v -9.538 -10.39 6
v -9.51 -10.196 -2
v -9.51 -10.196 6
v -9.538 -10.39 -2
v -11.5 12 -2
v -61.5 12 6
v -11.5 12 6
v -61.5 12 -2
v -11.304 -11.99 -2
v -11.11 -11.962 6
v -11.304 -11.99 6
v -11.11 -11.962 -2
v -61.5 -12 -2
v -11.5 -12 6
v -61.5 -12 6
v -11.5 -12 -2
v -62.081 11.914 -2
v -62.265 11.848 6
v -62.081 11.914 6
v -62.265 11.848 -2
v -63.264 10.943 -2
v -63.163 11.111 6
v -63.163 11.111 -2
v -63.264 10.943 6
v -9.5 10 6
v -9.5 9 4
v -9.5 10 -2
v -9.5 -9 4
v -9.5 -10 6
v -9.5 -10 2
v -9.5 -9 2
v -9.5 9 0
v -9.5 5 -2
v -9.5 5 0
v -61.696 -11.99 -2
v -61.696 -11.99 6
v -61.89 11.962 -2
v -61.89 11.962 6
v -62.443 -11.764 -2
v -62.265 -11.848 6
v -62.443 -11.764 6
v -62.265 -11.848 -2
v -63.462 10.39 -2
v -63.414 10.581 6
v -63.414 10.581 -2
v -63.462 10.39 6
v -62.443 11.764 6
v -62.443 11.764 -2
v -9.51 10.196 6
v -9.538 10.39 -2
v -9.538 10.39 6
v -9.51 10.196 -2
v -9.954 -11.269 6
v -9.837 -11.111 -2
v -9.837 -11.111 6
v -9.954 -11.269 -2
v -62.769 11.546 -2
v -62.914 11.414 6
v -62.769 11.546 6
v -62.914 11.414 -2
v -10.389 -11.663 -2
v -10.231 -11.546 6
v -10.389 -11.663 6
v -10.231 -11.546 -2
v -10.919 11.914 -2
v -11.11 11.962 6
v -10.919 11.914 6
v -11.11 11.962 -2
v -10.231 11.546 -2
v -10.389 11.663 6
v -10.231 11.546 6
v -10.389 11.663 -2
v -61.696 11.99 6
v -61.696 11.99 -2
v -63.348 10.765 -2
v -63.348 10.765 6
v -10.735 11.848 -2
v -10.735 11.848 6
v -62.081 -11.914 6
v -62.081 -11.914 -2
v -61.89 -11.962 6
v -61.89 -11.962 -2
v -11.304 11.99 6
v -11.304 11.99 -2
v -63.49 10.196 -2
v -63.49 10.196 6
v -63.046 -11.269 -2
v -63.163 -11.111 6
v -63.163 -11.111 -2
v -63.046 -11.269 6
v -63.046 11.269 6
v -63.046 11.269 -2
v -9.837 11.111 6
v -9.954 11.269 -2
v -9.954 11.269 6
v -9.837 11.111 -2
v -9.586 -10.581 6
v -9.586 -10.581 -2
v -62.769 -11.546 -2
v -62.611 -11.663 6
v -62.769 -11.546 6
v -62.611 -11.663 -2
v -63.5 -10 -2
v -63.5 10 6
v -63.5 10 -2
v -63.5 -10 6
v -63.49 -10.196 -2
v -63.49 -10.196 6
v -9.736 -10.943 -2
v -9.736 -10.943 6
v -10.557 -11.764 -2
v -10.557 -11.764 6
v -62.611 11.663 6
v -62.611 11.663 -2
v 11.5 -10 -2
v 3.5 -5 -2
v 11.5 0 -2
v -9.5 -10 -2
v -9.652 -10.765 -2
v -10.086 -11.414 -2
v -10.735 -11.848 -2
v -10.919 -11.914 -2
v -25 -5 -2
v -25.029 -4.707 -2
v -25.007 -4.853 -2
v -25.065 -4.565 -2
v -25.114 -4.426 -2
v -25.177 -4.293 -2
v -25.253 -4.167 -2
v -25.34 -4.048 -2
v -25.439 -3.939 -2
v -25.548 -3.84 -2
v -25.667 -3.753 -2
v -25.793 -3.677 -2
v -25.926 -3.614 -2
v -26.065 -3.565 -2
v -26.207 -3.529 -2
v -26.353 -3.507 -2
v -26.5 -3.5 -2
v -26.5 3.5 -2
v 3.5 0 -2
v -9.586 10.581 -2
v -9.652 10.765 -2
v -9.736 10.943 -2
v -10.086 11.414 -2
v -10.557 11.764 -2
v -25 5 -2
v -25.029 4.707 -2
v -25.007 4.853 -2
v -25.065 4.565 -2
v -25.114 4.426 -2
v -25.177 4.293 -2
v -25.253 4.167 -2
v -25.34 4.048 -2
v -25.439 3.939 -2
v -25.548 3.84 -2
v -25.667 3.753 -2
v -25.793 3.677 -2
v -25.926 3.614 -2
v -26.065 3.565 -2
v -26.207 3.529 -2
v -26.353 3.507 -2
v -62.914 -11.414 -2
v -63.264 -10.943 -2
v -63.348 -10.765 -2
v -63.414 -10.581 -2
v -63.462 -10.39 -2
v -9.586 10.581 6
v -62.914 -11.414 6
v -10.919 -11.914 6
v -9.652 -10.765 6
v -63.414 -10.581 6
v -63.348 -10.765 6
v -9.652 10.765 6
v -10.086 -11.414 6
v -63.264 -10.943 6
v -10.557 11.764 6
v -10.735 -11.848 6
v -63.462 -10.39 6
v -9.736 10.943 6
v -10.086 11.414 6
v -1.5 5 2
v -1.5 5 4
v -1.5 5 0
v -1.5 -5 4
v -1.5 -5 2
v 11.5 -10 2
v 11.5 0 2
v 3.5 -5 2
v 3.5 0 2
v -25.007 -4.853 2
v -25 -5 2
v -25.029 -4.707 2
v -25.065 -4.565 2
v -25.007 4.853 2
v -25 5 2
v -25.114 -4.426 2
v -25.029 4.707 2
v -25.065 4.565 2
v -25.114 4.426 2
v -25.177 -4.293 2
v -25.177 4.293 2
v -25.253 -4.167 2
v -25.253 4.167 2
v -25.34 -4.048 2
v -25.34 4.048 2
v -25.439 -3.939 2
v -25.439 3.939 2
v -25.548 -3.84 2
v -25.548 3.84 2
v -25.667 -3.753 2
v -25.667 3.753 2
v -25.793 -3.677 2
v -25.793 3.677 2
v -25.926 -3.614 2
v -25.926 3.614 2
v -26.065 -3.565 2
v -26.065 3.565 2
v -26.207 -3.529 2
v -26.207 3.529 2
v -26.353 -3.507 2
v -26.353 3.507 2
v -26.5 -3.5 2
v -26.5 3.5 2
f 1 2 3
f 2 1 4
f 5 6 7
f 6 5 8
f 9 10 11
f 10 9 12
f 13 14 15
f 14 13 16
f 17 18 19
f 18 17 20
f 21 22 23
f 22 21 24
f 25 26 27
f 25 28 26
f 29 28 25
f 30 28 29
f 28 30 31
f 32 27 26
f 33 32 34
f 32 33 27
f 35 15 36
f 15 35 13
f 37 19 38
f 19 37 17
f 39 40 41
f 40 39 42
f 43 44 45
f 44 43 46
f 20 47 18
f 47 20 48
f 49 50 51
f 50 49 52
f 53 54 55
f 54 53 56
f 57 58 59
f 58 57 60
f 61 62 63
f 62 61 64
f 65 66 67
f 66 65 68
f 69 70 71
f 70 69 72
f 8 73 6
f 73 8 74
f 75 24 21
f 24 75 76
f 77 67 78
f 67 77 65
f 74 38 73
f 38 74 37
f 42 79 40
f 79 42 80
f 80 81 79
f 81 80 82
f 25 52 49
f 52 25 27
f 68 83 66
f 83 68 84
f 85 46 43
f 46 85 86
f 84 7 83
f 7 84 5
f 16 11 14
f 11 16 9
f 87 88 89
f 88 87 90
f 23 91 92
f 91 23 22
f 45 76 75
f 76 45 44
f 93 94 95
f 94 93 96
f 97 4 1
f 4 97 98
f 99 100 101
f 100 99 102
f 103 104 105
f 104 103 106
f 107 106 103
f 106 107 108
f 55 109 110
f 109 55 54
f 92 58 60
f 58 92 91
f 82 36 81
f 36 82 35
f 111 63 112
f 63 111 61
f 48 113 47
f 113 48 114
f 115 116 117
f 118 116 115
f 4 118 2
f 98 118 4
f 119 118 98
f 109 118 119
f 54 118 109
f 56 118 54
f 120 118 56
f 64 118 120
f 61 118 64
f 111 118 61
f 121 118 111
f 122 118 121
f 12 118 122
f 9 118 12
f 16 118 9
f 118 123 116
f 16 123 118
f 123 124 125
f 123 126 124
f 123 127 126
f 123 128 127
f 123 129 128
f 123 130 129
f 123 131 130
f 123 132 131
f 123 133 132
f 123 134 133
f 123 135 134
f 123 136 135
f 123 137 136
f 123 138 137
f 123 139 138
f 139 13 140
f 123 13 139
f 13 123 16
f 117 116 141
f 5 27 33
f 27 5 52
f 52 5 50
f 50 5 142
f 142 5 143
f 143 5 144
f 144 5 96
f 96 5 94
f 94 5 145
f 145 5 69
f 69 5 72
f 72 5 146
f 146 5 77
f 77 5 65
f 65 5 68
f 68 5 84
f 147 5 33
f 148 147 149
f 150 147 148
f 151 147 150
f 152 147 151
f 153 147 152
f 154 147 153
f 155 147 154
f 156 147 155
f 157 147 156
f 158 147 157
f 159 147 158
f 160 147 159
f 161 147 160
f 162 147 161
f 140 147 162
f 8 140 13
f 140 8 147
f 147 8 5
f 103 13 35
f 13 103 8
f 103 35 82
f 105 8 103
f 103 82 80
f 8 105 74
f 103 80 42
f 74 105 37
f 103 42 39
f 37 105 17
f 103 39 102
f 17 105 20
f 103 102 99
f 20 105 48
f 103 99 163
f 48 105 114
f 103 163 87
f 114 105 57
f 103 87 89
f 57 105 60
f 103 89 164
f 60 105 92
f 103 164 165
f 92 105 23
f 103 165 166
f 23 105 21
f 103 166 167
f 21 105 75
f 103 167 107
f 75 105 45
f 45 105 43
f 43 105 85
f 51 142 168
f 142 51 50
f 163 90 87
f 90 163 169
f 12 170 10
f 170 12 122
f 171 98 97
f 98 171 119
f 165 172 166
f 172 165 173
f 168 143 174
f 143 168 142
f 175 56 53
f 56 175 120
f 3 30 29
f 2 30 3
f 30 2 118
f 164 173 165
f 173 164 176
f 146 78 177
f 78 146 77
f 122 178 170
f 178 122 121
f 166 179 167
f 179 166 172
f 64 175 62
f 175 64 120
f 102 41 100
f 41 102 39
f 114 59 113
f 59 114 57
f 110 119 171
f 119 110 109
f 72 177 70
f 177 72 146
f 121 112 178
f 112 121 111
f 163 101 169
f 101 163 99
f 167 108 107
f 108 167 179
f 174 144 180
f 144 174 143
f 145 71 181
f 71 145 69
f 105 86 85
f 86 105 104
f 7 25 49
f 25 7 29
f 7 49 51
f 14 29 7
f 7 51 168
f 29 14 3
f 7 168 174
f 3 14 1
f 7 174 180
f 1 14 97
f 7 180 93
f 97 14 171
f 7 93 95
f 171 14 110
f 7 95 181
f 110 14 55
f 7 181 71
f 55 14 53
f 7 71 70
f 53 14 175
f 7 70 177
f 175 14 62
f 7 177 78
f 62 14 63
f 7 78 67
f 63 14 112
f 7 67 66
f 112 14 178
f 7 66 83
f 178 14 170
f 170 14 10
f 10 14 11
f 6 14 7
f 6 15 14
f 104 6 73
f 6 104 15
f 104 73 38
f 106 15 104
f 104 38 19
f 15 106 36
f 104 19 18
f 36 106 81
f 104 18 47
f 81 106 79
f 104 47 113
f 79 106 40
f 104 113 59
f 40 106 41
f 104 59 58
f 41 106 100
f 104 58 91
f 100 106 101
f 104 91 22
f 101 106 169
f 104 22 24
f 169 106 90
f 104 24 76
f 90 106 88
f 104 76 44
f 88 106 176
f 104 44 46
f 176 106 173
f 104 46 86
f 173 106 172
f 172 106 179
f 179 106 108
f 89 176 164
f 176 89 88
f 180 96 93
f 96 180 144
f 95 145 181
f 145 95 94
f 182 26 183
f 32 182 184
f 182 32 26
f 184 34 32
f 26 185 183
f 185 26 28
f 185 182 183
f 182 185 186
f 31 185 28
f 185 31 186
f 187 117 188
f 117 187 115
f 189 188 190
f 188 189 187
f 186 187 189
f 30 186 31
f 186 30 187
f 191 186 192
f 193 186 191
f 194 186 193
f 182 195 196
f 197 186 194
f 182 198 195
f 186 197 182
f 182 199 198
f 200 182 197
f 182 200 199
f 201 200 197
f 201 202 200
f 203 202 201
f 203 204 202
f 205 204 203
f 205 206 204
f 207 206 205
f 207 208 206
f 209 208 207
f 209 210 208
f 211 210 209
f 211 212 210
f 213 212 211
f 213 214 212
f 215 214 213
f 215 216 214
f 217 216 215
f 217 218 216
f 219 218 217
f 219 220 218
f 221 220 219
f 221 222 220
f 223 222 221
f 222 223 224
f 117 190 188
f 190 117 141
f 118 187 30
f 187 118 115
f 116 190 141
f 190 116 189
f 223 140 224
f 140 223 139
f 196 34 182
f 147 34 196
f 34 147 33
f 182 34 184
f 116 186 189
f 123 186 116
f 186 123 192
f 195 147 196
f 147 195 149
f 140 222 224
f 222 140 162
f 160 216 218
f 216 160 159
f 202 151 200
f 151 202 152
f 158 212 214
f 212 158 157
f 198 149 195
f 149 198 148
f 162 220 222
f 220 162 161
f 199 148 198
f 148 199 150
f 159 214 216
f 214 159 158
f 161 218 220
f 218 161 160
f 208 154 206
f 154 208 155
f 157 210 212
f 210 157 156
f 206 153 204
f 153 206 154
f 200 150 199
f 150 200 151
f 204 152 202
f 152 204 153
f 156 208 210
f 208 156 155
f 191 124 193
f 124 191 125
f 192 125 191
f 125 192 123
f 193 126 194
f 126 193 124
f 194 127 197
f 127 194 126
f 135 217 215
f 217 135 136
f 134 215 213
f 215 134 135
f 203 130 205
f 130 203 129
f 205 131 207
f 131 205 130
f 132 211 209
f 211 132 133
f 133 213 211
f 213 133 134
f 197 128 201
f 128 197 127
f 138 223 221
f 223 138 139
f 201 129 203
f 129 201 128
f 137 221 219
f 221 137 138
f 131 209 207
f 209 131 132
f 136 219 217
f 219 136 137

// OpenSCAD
module paddle_plate() {
    difference() {
        union() {
            // Rounded rectangle head
            translate([-36.5, 0, 0])
            minkowski() {
                cube([50, 20, 4], center = true);
                cylinder(r = 2, h = 4, $fn = 64);
            }
            // Tapered neck
            translate([-11.5, 0, 0])
            linear_extrude(height = 4)
            polygon(points = [[0, -10], [0, 10], [10, 5], [10, -5]]);
            // Rectangular handle/shaft
            translate([0, -5, 0])
            cube([23, 10, 4], center = true);
        }
        // Rectangular window cutout
        translate([-11.5, 0, 0])
        cube([30, 10, 4], center = true);
    }
    // Circular through-holes
    translate([-26.5, 5, 0])
    cylinder(r = 1.5, h = 4, center = true, $fn = 64);
    translate([-26.5, -5, 0])
    cylinder(r = 1.5, h = 4, center = true, $fn = 64);
}

paddle_plate();
